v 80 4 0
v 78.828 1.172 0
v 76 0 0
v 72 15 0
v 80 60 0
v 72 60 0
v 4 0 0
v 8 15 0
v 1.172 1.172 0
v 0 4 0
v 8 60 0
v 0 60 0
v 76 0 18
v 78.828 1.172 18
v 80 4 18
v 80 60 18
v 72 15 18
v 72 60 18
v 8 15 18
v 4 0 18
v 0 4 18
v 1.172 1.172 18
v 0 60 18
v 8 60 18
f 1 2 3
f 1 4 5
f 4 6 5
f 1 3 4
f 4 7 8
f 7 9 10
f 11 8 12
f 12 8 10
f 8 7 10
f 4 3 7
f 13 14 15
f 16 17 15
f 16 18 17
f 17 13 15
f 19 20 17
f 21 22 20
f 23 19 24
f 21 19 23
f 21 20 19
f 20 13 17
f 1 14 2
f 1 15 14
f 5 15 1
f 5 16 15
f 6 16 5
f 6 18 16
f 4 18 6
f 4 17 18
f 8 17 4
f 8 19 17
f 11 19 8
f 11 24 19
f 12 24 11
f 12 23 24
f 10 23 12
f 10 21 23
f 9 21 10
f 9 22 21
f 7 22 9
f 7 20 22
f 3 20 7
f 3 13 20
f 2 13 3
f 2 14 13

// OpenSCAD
$fn = 32;

// ----------------------------------------------------------------------
// Heat sink frame: 80 x 60 mm frame, 8 mm walls
// ----------------------------------------------------------------------

// --- parameters (mm) ---
profile_height = 18;      // extrusion height
profile_points = 12;      // points of the closed outline

profile = [[0, 4], [1.172, 1.172], [4, 0], [76, 0], [78.828, 1.172], [80, 4], [80, 60], [72, 60], [72, 15], [8, 15], [8, 60], [0, 60]];  // single closed polygon, 12 points, counter clockwise

// --- the one profile operation ---
linear_extrude(height = profile_height) polygon(points = profile);
